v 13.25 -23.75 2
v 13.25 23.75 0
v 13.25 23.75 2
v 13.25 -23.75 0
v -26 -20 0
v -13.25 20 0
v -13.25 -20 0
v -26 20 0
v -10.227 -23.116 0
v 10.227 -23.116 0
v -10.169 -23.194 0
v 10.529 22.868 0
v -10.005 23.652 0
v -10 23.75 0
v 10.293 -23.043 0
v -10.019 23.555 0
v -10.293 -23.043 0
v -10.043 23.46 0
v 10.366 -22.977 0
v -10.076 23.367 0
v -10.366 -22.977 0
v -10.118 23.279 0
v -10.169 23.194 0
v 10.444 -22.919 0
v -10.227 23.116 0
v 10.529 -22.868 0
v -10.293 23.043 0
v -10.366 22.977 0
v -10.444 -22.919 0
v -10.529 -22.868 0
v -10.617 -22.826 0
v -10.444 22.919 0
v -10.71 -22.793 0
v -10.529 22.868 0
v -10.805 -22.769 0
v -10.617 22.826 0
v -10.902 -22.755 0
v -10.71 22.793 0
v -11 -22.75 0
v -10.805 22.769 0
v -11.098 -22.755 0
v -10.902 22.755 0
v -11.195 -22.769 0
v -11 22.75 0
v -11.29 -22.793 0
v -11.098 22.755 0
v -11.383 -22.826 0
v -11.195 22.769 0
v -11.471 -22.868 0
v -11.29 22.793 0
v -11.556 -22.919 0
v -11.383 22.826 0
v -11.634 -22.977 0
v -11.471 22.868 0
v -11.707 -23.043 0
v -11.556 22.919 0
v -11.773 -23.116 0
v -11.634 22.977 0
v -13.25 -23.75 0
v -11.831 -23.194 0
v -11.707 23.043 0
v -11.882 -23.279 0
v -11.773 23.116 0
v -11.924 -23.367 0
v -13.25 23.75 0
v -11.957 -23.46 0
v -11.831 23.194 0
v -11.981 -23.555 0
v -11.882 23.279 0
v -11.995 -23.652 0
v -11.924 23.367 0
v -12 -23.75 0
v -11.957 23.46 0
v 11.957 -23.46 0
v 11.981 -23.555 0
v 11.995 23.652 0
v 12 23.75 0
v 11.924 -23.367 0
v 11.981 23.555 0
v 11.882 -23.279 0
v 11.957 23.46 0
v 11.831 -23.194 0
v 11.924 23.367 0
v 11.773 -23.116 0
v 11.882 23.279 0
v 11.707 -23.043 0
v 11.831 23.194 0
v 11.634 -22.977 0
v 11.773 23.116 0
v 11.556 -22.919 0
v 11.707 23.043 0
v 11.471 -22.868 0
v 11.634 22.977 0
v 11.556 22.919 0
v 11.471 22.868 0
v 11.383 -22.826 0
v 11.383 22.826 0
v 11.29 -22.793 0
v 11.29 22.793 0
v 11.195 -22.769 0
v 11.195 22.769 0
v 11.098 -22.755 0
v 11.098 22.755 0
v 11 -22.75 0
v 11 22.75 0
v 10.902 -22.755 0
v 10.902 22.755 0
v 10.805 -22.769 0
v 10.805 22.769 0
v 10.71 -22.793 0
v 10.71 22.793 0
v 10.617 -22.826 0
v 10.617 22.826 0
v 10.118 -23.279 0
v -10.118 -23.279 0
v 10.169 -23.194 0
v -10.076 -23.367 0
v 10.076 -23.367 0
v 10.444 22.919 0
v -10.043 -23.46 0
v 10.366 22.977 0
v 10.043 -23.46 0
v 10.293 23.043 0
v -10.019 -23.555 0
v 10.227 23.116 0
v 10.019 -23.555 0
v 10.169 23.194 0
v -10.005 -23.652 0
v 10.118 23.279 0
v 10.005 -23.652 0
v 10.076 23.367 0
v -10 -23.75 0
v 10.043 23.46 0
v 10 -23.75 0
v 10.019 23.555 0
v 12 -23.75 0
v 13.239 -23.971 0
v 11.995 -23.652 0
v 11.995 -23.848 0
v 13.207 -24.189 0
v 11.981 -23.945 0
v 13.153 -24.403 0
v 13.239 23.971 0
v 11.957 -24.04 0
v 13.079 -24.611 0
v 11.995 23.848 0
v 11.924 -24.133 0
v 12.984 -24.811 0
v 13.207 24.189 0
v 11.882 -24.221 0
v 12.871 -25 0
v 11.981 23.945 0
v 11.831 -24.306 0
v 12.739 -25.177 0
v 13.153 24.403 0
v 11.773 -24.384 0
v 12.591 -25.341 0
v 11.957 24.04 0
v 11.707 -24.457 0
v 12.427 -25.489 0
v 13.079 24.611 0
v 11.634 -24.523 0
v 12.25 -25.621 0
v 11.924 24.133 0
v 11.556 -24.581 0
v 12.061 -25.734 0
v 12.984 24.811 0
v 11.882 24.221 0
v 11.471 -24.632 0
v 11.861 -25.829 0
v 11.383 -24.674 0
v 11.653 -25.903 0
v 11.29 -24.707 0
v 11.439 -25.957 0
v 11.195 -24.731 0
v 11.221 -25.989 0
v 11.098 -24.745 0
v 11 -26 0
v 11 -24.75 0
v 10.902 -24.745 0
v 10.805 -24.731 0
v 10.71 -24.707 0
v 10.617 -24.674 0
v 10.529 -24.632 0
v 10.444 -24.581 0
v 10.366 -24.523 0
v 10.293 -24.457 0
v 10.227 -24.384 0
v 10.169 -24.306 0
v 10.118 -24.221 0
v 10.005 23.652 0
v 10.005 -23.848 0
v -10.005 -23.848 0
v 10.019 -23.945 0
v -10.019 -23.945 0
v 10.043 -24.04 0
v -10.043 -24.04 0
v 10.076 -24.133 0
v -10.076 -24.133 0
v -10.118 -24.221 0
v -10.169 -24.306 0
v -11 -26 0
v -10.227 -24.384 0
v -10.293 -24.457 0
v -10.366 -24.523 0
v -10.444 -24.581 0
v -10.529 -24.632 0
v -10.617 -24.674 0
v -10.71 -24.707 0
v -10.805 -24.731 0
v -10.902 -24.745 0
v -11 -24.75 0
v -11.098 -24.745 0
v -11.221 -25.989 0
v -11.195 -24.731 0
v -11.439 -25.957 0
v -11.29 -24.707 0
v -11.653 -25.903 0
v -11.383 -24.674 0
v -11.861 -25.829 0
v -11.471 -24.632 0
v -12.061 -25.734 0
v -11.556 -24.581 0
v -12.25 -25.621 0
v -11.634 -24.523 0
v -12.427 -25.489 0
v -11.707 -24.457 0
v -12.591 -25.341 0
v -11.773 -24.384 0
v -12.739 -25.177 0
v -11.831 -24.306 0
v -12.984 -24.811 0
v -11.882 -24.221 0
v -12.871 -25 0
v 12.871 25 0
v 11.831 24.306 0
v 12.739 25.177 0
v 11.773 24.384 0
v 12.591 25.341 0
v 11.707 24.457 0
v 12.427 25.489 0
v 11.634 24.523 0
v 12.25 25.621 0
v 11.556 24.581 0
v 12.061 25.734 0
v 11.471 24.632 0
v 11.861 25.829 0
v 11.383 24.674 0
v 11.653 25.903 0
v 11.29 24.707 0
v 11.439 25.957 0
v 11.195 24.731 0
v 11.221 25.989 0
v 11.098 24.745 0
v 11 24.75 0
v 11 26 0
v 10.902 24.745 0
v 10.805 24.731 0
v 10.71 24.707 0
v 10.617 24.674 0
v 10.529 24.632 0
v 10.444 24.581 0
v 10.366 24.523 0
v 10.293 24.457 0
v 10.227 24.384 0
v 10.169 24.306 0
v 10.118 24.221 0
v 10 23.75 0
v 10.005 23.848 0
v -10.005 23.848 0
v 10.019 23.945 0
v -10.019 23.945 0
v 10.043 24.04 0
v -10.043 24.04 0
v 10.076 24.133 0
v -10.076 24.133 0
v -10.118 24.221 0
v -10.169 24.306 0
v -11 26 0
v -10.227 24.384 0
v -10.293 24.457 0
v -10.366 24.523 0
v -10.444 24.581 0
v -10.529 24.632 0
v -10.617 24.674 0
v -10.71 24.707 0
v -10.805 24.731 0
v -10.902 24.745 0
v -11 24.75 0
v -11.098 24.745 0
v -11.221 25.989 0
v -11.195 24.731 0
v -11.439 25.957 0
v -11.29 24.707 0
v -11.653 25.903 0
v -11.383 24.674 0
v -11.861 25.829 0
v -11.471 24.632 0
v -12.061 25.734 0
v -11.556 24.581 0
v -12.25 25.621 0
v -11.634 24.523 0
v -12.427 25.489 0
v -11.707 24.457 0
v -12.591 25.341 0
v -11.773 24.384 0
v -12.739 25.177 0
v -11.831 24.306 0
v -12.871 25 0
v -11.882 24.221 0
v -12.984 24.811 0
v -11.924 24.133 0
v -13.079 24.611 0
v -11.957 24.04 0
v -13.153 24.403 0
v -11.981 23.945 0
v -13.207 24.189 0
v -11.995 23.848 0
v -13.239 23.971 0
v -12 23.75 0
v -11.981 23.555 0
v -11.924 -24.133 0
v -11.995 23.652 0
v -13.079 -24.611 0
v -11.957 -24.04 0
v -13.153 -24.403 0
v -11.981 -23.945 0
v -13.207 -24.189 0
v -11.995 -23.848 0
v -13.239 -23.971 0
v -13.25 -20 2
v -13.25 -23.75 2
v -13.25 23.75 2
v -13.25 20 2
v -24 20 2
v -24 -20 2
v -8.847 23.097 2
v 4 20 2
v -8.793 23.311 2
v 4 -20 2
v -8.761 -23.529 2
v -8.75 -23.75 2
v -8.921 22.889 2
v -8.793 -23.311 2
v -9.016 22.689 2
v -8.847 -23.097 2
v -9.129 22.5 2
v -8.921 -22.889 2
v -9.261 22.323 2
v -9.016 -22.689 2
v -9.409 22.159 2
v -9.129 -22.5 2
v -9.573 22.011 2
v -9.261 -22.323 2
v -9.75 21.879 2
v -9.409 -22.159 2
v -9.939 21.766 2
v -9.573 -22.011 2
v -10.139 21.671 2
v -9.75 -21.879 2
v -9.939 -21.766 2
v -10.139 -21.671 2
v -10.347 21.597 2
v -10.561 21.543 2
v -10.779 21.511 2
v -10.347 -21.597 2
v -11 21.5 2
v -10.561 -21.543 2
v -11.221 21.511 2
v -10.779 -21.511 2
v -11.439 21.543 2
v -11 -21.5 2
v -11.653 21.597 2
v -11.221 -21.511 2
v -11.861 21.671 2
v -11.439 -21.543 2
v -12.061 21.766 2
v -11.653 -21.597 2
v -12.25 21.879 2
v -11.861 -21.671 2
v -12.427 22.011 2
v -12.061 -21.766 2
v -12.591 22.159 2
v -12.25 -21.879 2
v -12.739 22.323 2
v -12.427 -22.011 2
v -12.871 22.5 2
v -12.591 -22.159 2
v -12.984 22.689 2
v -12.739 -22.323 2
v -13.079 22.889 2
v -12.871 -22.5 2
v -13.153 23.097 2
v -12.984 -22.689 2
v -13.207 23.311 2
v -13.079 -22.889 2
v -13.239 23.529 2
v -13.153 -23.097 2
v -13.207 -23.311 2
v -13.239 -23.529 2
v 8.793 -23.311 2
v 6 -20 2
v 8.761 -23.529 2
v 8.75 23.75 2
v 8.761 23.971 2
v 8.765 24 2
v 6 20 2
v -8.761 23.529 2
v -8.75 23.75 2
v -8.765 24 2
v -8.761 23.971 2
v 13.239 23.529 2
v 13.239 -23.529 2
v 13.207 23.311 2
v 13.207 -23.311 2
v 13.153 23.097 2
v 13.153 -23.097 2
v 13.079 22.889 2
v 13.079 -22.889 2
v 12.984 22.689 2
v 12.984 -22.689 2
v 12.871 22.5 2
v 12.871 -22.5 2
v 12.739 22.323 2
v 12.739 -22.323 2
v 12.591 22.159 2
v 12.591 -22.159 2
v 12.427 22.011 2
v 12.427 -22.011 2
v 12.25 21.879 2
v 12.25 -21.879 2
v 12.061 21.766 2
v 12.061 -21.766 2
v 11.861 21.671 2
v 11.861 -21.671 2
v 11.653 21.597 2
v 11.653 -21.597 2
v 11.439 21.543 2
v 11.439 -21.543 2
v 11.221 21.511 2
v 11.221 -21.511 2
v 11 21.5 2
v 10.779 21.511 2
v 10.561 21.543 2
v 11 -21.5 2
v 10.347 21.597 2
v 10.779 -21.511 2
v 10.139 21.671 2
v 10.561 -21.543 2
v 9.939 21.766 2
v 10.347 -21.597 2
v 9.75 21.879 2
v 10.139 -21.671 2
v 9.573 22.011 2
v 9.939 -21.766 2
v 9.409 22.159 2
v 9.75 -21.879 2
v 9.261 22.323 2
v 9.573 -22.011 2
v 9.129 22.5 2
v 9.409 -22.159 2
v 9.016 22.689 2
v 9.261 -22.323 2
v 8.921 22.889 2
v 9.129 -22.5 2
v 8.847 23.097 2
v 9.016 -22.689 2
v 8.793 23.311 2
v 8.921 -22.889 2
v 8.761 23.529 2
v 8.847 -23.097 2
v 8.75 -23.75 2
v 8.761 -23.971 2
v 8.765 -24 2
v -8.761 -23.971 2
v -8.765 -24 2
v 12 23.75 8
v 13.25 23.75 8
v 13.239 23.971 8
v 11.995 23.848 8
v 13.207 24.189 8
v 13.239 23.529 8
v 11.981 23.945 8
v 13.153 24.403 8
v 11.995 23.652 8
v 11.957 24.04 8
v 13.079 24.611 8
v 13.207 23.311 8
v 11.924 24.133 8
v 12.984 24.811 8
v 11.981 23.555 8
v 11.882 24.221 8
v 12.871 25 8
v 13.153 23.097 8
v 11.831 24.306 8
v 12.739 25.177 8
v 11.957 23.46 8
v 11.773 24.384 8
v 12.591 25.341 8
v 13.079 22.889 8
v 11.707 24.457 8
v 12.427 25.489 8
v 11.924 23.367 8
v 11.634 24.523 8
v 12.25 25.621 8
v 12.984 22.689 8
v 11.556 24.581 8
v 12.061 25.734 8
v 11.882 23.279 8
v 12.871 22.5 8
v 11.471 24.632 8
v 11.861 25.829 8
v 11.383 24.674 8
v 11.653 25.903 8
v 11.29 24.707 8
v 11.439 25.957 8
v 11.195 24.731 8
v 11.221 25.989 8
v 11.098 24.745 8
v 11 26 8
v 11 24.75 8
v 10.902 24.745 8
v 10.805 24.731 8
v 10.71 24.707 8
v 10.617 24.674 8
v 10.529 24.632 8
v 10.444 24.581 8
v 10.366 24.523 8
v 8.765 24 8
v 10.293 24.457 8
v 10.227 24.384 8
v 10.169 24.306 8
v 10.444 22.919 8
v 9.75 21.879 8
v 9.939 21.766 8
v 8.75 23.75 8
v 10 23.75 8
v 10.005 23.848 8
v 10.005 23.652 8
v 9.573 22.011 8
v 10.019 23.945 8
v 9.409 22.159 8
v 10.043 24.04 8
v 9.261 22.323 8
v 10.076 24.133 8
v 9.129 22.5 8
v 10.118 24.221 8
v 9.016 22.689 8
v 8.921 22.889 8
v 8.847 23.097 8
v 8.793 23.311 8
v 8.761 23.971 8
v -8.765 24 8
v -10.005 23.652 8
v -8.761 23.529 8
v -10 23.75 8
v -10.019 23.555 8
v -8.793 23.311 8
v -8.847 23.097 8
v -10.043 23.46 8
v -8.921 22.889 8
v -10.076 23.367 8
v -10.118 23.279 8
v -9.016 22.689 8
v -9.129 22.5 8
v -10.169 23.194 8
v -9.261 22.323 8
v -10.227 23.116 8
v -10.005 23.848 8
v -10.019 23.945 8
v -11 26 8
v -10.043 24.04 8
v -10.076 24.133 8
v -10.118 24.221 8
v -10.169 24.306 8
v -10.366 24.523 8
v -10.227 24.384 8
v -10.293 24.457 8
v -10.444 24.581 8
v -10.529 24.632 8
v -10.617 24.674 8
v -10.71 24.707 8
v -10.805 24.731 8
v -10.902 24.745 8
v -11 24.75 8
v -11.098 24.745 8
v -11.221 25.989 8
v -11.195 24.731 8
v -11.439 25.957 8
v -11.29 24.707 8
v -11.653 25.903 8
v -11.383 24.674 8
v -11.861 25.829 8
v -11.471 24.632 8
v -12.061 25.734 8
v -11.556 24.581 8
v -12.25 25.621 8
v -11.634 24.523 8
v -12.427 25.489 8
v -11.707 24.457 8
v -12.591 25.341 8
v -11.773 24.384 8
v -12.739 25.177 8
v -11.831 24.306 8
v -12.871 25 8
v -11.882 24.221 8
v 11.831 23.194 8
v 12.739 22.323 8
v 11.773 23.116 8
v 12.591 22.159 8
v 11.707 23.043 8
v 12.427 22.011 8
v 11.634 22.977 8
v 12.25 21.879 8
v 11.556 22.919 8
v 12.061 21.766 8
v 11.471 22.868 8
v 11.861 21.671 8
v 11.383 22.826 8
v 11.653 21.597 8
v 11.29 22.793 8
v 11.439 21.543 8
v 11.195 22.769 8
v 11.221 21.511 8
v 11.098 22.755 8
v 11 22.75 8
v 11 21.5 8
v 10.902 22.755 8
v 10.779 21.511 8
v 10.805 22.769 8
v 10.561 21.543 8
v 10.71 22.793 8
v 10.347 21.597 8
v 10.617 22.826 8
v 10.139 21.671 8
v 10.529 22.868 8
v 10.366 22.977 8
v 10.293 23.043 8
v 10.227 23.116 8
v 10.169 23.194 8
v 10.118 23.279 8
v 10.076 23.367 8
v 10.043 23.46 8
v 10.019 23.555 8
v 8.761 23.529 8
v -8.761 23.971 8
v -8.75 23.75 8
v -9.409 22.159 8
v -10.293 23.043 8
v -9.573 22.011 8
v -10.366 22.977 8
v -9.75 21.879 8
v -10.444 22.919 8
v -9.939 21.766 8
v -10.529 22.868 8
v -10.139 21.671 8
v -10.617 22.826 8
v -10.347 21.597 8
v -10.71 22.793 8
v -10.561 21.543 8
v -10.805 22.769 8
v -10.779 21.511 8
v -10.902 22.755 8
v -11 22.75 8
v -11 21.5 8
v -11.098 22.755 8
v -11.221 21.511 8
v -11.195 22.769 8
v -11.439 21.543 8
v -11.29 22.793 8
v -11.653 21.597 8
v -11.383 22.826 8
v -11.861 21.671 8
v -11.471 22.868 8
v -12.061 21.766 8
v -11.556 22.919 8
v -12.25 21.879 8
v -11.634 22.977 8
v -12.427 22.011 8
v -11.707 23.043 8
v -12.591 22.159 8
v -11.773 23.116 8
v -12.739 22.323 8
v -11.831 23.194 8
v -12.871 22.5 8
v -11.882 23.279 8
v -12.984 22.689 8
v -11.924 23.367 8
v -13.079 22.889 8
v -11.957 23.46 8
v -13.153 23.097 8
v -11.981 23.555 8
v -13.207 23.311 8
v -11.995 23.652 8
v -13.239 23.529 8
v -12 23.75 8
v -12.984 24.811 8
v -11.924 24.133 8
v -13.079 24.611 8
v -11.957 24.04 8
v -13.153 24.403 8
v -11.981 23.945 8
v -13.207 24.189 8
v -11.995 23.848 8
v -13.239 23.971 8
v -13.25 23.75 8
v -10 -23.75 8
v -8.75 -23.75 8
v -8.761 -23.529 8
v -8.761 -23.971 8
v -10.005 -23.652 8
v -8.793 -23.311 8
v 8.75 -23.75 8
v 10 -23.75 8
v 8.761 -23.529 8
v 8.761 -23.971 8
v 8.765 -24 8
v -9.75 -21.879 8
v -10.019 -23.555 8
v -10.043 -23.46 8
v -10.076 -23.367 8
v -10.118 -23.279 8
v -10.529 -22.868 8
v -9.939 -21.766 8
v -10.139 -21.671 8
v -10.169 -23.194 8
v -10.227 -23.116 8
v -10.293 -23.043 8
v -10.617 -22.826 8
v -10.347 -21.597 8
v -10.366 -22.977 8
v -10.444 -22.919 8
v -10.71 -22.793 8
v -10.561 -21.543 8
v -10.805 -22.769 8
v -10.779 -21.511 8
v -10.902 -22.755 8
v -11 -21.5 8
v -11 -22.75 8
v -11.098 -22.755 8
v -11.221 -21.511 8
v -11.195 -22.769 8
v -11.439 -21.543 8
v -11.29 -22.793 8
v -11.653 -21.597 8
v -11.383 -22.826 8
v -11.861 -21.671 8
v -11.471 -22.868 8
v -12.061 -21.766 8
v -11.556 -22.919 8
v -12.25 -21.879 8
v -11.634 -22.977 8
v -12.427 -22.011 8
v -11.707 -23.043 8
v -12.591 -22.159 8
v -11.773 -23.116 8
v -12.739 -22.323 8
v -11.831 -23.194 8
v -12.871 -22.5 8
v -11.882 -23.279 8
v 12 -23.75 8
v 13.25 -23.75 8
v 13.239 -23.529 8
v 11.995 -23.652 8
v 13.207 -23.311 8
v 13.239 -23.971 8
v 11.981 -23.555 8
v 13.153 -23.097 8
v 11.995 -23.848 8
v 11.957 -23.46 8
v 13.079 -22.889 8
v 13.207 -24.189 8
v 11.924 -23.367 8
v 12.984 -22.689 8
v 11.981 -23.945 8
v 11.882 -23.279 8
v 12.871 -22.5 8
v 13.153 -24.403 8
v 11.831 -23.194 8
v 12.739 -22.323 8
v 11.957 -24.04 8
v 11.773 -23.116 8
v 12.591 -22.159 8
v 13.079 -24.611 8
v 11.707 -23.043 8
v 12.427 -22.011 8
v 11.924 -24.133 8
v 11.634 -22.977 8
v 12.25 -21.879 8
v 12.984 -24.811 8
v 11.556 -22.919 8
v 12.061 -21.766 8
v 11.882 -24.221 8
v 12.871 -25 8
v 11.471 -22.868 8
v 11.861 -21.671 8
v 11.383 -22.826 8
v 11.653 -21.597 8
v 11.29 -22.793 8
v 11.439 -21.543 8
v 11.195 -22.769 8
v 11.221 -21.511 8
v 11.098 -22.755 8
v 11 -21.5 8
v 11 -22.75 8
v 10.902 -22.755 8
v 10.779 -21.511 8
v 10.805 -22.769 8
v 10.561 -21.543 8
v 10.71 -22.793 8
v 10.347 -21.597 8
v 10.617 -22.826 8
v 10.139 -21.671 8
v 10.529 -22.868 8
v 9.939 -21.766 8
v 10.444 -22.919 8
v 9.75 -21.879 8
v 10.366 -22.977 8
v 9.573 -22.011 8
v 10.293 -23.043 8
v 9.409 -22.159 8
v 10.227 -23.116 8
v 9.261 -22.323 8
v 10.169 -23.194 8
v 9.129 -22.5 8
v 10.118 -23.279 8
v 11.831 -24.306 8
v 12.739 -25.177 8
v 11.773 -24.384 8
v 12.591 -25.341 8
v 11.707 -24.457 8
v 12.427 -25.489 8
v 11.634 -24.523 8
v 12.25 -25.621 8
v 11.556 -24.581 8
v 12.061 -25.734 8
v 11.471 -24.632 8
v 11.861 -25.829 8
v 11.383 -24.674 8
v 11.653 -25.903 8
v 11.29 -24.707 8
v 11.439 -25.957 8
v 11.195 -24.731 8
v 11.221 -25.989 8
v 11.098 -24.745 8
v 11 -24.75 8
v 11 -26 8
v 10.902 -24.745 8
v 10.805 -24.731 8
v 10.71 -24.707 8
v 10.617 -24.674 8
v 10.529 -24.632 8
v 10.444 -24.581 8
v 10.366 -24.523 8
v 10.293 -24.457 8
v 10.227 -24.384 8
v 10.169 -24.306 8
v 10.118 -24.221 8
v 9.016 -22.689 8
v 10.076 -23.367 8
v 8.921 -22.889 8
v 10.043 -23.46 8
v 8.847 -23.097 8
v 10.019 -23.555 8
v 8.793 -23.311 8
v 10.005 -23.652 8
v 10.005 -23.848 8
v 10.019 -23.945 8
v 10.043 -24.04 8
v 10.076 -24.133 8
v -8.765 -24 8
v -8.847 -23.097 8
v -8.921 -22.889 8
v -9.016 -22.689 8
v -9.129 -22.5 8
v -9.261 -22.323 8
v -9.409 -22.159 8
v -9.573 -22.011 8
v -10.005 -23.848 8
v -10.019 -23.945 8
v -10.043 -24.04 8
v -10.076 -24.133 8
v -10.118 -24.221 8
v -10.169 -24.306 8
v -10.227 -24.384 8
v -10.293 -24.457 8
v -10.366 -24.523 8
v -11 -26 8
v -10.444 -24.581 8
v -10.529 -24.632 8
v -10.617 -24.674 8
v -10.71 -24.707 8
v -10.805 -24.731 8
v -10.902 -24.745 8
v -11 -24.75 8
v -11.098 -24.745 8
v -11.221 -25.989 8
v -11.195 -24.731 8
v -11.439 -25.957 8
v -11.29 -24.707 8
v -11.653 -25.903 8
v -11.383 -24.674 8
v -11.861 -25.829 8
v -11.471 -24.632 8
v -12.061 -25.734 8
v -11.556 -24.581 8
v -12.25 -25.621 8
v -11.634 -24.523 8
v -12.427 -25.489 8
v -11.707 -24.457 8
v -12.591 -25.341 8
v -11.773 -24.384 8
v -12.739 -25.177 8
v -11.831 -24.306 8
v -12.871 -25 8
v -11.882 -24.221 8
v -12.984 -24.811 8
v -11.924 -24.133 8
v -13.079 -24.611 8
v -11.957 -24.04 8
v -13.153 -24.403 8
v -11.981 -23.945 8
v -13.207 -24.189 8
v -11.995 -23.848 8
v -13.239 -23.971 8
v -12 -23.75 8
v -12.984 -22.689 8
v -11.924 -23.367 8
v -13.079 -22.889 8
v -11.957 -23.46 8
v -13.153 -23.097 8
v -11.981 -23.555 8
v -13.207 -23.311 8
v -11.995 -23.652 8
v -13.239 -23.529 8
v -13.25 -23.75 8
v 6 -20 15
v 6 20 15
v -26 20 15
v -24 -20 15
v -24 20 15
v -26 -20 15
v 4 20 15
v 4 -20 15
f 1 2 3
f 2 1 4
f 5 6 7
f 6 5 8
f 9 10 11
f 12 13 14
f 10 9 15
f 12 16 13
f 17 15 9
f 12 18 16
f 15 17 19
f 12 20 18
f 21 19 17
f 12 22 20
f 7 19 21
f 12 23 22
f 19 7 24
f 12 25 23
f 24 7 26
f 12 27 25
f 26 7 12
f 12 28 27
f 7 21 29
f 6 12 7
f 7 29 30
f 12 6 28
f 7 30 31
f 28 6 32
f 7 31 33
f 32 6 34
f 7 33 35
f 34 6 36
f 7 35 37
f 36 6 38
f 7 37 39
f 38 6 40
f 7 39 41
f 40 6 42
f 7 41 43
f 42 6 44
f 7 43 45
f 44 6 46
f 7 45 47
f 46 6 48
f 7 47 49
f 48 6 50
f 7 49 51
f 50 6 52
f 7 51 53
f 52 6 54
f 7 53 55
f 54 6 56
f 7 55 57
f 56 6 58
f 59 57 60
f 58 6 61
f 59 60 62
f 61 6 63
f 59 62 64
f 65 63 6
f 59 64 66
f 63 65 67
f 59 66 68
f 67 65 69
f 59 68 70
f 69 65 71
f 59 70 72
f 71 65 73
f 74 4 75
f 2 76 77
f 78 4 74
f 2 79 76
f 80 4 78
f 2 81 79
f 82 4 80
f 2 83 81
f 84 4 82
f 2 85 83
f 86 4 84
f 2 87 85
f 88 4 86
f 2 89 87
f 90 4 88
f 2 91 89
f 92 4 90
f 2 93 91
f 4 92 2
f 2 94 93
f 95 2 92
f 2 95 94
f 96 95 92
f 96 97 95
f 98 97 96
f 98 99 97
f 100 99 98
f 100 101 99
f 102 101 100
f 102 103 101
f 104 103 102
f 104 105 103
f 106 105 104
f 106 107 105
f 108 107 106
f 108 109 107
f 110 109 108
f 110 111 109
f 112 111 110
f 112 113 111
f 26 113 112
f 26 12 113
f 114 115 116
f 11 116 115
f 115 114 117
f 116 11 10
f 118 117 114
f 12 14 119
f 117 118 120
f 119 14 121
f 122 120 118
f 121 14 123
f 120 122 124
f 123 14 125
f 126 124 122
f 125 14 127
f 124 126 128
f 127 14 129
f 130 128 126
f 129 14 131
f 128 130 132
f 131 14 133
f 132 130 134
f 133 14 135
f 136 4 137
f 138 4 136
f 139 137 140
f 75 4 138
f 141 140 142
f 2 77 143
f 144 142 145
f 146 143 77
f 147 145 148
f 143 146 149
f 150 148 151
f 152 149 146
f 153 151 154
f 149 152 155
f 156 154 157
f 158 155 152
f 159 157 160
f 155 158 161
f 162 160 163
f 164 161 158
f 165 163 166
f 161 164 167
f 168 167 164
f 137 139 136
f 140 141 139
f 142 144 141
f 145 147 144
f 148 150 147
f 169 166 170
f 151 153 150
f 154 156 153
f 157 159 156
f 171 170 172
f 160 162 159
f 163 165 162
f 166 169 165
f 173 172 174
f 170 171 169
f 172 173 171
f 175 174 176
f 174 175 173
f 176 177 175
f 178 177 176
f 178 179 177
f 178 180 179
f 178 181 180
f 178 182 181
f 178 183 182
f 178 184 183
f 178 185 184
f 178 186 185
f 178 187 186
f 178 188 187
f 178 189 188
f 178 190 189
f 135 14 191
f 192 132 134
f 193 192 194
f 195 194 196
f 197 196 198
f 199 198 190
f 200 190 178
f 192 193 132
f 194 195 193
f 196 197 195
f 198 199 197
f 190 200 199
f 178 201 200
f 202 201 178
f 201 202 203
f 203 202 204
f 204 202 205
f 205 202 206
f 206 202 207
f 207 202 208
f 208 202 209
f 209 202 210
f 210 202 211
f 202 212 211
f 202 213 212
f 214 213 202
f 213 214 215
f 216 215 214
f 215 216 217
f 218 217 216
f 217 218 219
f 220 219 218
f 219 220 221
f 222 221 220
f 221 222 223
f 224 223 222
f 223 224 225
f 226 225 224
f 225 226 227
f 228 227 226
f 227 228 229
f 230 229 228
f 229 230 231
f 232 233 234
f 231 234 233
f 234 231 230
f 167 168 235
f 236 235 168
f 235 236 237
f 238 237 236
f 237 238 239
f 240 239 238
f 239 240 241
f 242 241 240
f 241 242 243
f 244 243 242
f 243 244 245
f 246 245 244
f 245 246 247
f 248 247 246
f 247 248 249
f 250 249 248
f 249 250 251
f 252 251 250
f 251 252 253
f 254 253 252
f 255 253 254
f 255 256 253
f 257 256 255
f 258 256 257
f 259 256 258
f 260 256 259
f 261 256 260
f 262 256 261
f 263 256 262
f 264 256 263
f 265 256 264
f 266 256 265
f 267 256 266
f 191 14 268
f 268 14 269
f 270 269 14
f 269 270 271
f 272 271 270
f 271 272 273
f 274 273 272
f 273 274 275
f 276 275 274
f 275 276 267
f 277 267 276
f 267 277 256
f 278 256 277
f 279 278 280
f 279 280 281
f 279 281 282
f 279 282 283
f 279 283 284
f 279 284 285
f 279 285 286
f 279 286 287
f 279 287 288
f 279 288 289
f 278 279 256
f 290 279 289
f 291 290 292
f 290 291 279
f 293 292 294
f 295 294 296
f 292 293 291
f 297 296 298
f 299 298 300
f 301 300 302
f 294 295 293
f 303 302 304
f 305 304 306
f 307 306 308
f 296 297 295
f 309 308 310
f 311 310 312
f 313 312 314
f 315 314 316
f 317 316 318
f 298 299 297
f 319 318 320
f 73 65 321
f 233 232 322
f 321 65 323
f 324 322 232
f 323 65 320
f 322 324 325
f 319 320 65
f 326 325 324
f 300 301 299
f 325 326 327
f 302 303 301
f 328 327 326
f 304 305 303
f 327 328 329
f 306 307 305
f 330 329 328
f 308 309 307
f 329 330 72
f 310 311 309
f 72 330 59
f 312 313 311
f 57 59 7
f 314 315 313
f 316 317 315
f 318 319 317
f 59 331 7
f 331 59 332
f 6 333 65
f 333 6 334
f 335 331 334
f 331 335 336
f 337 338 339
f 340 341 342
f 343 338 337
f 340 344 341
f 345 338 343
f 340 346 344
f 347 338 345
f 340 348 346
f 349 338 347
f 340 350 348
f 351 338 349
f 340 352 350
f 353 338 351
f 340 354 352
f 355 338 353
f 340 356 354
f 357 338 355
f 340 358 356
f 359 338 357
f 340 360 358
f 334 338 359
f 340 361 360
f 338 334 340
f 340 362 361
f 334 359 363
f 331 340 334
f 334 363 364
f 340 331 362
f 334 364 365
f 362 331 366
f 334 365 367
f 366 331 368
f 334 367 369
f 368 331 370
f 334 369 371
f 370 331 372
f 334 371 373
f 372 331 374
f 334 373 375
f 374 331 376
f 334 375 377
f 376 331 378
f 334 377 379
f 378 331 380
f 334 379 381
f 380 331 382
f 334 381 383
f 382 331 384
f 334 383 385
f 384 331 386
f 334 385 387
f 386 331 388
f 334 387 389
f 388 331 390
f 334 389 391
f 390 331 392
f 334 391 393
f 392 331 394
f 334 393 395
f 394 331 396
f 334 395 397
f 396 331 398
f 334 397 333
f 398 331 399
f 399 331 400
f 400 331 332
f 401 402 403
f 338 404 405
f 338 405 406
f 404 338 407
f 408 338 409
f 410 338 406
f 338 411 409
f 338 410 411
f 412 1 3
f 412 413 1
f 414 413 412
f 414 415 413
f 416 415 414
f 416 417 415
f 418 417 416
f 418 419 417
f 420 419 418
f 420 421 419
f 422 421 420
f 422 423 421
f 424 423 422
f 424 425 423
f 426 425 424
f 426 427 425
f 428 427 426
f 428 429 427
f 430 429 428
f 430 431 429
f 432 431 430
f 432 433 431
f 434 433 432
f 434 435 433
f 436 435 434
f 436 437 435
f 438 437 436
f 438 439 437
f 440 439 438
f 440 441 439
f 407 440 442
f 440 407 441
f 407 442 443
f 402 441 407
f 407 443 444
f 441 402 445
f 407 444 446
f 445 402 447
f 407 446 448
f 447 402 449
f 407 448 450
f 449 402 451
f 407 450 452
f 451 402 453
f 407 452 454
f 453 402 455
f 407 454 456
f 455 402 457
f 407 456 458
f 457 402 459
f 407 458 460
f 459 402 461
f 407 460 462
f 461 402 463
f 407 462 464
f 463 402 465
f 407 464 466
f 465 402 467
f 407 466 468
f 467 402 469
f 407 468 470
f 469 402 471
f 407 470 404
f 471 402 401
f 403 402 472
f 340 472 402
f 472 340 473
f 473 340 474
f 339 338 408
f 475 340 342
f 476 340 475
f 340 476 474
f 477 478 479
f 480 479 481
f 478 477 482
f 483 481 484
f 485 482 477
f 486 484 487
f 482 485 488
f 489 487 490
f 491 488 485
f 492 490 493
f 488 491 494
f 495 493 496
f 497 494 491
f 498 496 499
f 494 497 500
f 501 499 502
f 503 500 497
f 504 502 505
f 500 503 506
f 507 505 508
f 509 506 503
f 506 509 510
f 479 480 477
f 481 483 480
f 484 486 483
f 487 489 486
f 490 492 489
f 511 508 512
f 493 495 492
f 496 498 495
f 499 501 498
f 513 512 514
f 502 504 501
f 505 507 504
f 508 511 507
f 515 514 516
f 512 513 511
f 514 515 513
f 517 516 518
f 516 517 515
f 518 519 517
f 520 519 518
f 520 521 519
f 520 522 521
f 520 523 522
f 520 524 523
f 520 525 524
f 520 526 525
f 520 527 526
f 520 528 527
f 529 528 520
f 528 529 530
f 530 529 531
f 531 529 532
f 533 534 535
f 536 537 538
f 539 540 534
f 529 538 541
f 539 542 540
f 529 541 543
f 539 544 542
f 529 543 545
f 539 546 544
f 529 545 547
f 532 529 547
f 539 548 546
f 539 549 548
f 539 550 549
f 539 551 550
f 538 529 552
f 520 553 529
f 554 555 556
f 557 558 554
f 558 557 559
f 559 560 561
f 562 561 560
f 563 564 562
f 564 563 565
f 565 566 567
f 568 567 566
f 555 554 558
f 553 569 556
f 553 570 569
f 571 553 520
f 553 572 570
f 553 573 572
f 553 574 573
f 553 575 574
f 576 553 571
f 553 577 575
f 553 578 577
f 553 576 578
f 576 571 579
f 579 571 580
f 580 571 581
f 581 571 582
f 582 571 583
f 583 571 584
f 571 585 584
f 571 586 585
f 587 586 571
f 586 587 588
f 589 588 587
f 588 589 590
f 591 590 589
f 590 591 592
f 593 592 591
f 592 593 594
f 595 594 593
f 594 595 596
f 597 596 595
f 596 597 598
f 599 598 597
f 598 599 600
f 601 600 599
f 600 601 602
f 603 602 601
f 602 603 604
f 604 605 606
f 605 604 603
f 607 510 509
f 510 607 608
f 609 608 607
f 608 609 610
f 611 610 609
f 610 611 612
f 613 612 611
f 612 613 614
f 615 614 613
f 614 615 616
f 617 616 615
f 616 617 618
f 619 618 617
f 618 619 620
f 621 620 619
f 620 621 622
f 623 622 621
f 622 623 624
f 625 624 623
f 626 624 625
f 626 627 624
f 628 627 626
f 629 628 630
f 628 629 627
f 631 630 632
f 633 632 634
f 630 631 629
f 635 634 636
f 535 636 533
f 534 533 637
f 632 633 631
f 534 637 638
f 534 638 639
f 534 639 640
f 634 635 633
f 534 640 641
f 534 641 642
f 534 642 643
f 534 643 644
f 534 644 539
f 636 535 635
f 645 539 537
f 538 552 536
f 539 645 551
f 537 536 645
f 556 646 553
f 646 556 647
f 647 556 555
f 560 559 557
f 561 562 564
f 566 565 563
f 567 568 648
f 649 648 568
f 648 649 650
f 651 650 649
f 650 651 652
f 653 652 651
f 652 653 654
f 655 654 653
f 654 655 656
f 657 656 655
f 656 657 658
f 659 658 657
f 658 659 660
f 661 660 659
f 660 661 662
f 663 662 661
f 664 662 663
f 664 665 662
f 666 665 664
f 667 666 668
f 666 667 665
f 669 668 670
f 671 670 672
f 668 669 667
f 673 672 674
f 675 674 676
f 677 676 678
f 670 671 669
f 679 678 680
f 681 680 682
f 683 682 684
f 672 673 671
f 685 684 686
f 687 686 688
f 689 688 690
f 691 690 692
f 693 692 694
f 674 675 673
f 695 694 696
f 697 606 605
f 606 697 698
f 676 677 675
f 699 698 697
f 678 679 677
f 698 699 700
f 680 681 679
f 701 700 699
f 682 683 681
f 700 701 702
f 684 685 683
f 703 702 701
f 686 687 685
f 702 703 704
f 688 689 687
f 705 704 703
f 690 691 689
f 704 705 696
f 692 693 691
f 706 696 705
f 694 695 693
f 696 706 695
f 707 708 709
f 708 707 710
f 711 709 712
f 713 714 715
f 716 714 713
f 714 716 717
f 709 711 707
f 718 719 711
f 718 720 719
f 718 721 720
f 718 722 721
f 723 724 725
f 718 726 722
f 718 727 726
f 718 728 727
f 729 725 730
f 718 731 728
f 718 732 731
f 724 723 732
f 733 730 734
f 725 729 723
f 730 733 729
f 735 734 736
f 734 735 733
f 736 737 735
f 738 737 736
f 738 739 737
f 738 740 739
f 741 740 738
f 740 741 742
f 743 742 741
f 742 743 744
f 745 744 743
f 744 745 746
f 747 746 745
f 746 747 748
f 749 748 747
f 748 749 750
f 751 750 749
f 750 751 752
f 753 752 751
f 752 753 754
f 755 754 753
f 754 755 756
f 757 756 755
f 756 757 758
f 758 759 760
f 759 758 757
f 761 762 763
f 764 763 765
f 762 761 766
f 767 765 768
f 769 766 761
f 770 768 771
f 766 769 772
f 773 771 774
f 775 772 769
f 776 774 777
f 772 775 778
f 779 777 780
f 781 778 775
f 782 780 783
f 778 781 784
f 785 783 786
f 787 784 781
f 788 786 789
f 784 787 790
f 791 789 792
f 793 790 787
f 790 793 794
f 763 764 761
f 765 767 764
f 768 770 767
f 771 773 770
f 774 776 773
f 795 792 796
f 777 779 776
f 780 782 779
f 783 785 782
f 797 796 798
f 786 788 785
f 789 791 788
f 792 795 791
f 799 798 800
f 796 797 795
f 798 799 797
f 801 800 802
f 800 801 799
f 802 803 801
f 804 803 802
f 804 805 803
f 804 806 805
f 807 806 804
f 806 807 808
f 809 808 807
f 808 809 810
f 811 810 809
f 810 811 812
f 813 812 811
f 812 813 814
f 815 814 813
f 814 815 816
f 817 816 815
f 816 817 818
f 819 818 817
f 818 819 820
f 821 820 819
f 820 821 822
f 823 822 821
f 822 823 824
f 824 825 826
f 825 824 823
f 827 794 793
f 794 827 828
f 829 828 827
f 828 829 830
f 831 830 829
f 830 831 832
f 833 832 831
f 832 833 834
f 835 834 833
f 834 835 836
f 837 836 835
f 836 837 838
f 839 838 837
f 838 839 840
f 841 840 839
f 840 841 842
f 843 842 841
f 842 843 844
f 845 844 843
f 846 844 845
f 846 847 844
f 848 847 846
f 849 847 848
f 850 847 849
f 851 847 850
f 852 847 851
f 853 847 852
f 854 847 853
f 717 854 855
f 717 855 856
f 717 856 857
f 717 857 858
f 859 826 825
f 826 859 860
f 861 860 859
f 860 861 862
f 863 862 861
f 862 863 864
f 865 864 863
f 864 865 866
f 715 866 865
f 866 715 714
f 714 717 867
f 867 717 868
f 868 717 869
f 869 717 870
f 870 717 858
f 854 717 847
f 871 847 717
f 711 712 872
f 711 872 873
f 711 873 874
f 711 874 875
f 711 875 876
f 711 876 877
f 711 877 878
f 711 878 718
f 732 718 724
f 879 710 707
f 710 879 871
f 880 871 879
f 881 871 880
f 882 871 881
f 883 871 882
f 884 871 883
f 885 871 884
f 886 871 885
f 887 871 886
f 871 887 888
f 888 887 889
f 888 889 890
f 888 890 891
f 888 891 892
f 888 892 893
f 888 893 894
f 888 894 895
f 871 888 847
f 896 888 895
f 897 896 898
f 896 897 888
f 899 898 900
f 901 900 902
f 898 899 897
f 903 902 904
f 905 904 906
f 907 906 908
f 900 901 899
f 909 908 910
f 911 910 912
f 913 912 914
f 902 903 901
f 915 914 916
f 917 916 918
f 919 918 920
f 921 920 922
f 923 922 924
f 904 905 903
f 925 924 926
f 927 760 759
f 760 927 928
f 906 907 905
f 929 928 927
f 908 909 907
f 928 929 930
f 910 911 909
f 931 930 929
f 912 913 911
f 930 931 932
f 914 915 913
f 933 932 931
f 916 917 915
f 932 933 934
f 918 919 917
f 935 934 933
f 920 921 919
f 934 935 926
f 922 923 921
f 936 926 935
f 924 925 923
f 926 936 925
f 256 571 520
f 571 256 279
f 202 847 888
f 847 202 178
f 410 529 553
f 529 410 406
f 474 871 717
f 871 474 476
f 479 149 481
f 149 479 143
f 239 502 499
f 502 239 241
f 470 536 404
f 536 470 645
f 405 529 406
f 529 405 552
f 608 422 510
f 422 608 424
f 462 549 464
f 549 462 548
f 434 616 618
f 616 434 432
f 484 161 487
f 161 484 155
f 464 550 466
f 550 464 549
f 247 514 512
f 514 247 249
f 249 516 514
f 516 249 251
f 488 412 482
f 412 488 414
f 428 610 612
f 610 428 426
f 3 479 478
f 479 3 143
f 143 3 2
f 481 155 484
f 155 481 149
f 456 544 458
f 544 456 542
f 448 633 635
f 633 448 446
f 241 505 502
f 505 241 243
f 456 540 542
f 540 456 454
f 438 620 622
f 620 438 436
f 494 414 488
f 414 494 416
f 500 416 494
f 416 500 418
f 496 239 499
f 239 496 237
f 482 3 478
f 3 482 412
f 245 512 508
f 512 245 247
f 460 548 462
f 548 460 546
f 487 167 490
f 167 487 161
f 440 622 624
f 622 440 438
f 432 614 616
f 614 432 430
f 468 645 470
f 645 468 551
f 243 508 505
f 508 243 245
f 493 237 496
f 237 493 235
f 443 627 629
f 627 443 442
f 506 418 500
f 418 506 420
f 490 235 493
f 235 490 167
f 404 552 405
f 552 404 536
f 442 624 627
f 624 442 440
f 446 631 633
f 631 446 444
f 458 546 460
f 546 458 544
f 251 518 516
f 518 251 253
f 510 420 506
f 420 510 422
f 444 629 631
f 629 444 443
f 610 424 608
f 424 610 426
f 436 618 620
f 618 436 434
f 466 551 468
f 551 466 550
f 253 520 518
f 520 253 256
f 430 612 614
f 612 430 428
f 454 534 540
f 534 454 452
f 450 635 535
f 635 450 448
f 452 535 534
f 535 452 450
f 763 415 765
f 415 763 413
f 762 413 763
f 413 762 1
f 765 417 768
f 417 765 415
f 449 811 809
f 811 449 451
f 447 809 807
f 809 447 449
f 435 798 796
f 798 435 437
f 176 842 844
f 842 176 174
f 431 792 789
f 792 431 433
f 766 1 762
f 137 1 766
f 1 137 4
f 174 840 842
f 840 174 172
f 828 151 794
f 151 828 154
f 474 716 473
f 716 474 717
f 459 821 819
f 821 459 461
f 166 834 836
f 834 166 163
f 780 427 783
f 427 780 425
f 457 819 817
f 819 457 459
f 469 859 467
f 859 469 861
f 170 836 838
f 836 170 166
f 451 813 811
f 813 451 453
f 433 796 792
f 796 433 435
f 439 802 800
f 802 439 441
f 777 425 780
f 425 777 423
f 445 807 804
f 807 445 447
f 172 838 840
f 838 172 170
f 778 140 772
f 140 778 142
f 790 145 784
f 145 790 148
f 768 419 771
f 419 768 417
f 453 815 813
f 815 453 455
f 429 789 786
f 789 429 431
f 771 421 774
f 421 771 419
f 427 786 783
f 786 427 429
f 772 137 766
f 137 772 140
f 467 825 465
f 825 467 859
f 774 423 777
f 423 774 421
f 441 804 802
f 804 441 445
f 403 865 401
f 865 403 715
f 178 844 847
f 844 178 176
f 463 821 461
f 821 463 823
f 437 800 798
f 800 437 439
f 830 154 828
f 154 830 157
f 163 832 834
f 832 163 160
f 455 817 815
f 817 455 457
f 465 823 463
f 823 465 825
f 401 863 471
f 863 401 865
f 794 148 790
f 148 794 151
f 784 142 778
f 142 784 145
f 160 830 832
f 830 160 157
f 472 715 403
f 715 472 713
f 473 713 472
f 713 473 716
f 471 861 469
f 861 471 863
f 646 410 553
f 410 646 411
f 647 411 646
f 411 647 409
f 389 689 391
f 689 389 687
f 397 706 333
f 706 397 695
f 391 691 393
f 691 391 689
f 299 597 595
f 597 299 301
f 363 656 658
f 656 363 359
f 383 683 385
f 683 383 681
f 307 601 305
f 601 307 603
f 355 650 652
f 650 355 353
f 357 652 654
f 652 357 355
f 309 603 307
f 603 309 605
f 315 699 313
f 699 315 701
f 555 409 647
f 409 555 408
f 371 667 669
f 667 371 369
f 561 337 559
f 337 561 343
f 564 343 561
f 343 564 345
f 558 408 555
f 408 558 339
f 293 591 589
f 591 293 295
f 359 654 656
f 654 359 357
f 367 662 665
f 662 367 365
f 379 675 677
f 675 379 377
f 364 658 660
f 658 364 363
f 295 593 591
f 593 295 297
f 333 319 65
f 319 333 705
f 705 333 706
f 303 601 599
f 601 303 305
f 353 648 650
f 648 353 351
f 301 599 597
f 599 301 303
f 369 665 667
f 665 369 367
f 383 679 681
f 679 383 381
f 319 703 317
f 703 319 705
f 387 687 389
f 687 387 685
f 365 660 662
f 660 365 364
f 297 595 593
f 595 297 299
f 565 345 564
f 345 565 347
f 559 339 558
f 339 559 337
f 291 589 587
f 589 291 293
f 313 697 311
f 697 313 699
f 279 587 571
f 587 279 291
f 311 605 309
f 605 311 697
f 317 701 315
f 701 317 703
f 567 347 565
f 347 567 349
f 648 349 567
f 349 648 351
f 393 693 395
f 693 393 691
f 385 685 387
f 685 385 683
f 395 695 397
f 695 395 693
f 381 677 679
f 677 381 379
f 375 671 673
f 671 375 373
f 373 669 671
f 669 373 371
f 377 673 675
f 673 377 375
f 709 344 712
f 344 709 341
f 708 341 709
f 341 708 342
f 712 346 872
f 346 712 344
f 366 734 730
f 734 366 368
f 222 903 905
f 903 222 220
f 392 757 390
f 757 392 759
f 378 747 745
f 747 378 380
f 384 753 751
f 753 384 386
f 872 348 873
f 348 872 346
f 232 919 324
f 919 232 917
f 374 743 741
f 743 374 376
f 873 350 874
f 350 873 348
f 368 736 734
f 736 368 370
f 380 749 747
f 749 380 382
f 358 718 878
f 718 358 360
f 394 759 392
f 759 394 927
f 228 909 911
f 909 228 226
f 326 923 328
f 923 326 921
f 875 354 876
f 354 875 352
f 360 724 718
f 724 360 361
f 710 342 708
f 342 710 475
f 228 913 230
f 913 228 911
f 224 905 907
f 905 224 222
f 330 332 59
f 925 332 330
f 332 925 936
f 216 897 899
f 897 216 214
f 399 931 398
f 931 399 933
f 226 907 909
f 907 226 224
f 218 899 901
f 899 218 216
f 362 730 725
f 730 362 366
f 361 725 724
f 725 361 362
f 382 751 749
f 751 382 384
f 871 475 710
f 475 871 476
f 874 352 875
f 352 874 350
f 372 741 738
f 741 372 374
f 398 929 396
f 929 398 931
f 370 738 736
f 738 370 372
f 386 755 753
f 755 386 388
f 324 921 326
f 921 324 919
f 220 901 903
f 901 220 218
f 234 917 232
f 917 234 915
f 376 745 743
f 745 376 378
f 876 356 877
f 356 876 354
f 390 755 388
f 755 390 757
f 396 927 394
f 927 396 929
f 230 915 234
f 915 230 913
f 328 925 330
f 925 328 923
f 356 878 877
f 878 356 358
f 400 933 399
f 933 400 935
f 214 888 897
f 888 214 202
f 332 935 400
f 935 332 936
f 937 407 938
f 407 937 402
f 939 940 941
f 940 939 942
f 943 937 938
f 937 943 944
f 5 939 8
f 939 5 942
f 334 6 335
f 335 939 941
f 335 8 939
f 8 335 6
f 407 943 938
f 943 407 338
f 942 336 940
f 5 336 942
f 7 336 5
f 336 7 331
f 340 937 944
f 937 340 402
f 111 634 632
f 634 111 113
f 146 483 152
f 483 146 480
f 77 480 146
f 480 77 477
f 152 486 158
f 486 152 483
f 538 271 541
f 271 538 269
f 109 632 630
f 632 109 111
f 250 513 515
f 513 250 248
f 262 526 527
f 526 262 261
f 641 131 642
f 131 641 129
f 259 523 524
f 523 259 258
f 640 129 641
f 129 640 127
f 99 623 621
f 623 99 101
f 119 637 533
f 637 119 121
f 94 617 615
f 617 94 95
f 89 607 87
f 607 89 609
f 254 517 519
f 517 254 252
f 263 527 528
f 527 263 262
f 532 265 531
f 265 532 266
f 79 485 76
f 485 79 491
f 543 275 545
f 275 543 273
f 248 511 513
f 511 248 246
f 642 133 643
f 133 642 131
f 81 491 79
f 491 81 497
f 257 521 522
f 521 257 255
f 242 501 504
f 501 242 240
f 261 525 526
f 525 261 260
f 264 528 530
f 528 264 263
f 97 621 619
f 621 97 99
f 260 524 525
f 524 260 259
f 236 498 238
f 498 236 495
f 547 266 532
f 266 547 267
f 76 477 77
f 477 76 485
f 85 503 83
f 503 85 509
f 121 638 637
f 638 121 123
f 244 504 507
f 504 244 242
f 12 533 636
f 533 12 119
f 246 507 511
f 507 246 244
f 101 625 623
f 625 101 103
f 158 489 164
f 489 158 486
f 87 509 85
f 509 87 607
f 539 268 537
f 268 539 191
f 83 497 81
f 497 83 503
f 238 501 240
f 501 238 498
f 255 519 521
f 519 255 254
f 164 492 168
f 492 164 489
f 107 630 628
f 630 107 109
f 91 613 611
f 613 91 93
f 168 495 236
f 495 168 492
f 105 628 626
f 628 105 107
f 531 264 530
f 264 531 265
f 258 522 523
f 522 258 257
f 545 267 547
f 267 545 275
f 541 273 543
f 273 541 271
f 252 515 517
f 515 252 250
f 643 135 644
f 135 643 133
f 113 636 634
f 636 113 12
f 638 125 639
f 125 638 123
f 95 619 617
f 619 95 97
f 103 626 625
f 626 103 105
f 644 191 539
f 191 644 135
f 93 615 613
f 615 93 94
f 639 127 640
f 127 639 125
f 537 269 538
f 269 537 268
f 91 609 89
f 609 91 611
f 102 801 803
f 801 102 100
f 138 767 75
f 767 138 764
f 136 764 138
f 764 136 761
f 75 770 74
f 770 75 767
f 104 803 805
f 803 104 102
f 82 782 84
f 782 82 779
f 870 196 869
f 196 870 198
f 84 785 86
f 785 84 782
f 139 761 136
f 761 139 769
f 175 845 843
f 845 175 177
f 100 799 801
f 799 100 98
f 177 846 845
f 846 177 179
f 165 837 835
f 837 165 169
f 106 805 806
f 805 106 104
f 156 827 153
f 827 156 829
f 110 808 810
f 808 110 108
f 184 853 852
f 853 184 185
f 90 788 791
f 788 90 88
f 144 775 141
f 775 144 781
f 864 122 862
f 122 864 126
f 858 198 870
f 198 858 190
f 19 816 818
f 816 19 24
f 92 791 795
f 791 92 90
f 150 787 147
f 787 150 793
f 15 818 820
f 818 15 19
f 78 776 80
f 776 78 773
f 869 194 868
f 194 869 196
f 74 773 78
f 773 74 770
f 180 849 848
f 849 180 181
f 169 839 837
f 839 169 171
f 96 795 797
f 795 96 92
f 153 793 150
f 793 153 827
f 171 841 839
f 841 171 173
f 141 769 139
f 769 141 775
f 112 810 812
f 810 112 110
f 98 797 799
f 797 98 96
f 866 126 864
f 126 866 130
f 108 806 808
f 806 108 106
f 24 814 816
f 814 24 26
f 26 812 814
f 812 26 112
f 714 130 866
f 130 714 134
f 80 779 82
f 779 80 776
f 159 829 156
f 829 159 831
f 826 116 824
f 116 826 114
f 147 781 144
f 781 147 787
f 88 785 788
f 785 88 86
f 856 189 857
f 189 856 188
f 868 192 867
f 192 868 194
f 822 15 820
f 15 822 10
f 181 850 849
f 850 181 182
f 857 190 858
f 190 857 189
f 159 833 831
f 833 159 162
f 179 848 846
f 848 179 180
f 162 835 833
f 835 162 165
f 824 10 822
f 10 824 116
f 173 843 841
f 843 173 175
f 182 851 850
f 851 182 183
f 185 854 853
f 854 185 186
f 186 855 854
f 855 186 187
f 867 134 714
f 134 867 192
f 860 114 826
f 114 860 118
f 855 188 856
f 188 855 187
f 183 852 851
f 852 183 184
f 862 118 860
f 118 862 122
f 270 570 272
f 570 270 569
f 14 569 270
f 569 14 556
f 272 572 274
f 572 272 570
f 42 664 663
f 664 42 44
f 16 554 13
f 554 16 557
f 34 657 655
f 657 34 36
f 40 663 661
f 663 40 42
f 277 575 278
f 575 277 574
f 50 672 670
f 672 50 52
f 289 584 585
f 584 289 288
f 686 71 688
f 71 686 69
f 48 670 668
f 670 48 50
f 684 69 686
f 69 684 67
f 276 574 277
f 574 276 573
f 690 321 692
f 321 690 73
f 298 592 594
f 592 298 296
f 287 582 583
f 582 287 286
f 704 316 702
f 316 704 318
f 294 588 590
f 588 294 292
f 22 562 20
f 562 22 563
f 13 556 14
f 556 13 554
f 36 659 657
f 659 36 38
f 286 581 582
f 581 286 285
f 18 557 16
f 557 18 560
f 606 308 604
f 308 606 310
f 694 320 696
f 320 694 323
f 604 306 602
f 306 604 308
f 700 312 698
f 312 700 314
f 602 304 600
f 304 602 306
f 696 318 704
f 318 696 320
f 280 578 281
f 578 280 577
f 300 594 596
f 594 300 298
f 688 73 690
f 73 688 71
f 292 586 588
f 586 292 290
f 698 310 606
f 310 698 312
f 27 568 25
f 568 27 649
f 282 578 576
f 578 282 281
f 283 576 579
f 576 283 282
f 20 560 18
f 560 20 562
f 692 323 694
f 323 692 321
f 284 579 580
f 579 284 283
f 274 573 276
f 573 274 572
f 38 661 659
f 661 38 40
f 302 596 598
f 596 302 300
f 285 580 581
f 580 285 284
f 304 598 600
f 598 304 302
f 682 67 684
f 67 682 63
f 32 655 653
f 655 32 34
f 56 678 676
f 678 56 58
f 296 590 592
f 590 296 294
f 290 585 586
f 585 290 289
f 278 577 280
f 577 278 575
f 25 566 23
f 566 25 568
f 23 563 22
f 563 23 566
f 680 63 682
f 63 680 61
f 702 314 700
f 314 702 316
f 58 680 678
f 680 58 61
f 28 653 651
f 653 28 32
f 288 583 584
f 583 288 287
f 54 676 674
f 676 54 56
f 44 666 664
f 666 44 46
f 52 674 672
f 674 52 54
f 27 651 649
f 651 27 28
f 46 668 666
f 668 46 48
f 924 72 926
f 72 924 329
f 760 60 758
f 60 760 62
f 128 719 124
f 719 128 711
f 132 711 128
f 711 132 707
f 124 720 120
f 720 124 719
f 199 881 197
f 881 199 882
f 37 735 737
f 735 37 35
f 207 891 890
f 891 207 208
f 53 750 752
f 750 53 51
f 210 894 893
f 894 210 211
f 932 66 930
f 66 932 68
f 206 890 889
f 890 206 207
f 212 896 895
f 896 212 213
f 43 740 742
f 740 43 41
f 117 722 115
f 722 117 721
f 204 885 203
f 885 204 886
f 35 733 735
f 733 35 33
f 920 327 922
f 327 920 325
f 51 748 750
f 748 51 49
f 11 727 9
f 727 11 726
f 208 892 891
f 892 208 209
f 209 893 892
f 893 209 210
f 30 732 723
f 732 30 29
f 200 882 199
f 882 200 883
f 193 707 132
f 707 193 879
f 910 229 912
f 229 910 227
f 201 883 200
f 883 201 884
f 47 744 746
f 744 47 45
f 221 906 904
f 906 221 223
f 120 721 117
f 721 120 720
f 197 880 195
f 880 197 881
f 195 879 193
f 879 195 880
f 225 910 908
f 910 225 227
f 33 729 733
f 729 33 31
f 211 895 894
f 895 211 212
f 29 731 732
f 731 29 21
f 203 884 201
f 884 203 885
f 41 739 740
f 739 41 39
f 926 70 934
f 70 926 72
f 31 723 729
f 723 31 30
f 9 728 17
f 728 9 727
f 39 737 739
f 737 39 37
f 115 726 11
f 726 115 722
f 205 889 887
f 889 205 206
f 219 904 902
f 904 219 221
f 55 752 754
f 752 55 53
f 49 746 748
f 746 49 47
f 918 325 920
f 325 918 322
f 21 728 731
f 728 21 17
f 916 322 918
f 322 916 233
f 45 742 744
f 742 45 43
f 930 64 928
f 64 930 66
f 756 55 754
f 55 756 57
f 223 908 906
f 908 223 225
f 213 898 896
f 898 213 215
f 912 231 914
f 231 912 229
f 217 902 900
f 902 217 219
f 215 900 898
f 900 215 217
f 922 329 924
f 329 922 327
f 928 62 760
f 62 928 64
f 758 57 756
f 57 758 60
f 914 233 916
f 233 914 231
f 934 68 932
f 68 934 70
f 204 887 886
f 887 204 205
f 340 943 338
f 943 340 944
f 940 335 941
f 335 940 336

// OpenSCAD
$fn = 64;

BASE_L = 47.5;
BASE_W = 22;

PIN_RADIUS_INNER = 1;
PIN_RADIUS_OUTER = 4.5/2;

BASE_H = 2;
PIN_H = 8;

HOLE_H = 30;

WALL_THICKNESS = 2;

HOLDER_OUT = (BASE_W/2) + 15;
HOLDER_IN = (BASE_W/2) - 5;
HOLDER_L = 40;
HOLDER_H = 15;

HOLDER_W = HOLDER_OUT + HOLDER_IN;
HOLDER_CENTER = (-HOLDER_OUT + HOLDER_IN) / 2;

module plate(w, l, h) {
    translate([0, 0, h/2]) {
        cube([w, l, h], center=true);
    }
}

module pin(r, h) {
    translate([0, 0, h/2]) {
        cylinder(r=r, h=h, center=true);
    }
}

module base() {
    difference() {
        plate(BASE_W + (PIN_RADIUS_OUTER*2), BASE_L, PIN_H);
        translate([0, 0, BASE_H]) plate(BASE_W + ((PIN_RADIUS_OUTER+WALL_THICKNESS)*2), BASE_L, PIN_H);
    }
    difference() {
        plate(BASE_W, BASE_L + (PIN_RADIUS_OUTER*2), PIN_H);
        translate([0, 0, BASE_H]) plate(BASE_W, BASE_L + ((PIN_RADIUS_OUTER-WALL_THICKNESS)*2), PIN_H);
    }
    translate([+BASE_W/2, +BASE_L/2, 0]) pin(r=PIN_RADIUS_OUTER, h=PIN_H);
    translate([+BASE_W/2, -BASE_L/2, 0]) pin(r=PIN_RADIUS_OUTER, h=PIN_H);
    translate([-BASE_W/2, +BASE_L/2, 0]) pin(r=PIN_RADIUS_OUTER, h=PIN_H);
    translate([-BASE_W/2, -BASE_L/2, 0]) pin(r=PIN_RADIUS_OUTER, h=PIN_H);
}

module pin_holes() {
    translate([0, 0, -HOLE_H/2]) {
        translate([+BASE_W/2, +BASE_L/2, 0]) pin(r=PIN_RADIUS_INNER, h=HOLE_H);
        translate([+BASE_W/2, -BASE_L/2, 0]) pin(r=PIN_RADIUS_INNER, h=HOLE_H);
        translate([-BASE_W/2, +BASE_L/2, 0]) pin(r=PIN_RADIUS_INNER, h=HOLE_H);
        translate([-BASE_W/2, -BASE_L/2, 0]) pin(r=PIN_RADIUS_INNER, h=HOLE_H);
    }
}


module holder_fill() {
    translate([HOLDER_CENTER, 0, 0])
    plate(HOLDER_W, HOLDER_L, HOLDER_H);
}

module holder_empty() {
    translate([HOLDER_CENTER, 0, BASE_H])
    plate(HOLDER_W - (WALL_THICKNESS*2), HOLDER_L + 1, HOLDER_H);
}

module holder() {
    difference() {
        holder_fill();
        holder_empty();
    }
}

module all() {
    difference() {
        translate() {
            base();
            holder_fill();
        }
        translate() {
            pin_holes();
            holder_empty();
        }
    }
}

all();
